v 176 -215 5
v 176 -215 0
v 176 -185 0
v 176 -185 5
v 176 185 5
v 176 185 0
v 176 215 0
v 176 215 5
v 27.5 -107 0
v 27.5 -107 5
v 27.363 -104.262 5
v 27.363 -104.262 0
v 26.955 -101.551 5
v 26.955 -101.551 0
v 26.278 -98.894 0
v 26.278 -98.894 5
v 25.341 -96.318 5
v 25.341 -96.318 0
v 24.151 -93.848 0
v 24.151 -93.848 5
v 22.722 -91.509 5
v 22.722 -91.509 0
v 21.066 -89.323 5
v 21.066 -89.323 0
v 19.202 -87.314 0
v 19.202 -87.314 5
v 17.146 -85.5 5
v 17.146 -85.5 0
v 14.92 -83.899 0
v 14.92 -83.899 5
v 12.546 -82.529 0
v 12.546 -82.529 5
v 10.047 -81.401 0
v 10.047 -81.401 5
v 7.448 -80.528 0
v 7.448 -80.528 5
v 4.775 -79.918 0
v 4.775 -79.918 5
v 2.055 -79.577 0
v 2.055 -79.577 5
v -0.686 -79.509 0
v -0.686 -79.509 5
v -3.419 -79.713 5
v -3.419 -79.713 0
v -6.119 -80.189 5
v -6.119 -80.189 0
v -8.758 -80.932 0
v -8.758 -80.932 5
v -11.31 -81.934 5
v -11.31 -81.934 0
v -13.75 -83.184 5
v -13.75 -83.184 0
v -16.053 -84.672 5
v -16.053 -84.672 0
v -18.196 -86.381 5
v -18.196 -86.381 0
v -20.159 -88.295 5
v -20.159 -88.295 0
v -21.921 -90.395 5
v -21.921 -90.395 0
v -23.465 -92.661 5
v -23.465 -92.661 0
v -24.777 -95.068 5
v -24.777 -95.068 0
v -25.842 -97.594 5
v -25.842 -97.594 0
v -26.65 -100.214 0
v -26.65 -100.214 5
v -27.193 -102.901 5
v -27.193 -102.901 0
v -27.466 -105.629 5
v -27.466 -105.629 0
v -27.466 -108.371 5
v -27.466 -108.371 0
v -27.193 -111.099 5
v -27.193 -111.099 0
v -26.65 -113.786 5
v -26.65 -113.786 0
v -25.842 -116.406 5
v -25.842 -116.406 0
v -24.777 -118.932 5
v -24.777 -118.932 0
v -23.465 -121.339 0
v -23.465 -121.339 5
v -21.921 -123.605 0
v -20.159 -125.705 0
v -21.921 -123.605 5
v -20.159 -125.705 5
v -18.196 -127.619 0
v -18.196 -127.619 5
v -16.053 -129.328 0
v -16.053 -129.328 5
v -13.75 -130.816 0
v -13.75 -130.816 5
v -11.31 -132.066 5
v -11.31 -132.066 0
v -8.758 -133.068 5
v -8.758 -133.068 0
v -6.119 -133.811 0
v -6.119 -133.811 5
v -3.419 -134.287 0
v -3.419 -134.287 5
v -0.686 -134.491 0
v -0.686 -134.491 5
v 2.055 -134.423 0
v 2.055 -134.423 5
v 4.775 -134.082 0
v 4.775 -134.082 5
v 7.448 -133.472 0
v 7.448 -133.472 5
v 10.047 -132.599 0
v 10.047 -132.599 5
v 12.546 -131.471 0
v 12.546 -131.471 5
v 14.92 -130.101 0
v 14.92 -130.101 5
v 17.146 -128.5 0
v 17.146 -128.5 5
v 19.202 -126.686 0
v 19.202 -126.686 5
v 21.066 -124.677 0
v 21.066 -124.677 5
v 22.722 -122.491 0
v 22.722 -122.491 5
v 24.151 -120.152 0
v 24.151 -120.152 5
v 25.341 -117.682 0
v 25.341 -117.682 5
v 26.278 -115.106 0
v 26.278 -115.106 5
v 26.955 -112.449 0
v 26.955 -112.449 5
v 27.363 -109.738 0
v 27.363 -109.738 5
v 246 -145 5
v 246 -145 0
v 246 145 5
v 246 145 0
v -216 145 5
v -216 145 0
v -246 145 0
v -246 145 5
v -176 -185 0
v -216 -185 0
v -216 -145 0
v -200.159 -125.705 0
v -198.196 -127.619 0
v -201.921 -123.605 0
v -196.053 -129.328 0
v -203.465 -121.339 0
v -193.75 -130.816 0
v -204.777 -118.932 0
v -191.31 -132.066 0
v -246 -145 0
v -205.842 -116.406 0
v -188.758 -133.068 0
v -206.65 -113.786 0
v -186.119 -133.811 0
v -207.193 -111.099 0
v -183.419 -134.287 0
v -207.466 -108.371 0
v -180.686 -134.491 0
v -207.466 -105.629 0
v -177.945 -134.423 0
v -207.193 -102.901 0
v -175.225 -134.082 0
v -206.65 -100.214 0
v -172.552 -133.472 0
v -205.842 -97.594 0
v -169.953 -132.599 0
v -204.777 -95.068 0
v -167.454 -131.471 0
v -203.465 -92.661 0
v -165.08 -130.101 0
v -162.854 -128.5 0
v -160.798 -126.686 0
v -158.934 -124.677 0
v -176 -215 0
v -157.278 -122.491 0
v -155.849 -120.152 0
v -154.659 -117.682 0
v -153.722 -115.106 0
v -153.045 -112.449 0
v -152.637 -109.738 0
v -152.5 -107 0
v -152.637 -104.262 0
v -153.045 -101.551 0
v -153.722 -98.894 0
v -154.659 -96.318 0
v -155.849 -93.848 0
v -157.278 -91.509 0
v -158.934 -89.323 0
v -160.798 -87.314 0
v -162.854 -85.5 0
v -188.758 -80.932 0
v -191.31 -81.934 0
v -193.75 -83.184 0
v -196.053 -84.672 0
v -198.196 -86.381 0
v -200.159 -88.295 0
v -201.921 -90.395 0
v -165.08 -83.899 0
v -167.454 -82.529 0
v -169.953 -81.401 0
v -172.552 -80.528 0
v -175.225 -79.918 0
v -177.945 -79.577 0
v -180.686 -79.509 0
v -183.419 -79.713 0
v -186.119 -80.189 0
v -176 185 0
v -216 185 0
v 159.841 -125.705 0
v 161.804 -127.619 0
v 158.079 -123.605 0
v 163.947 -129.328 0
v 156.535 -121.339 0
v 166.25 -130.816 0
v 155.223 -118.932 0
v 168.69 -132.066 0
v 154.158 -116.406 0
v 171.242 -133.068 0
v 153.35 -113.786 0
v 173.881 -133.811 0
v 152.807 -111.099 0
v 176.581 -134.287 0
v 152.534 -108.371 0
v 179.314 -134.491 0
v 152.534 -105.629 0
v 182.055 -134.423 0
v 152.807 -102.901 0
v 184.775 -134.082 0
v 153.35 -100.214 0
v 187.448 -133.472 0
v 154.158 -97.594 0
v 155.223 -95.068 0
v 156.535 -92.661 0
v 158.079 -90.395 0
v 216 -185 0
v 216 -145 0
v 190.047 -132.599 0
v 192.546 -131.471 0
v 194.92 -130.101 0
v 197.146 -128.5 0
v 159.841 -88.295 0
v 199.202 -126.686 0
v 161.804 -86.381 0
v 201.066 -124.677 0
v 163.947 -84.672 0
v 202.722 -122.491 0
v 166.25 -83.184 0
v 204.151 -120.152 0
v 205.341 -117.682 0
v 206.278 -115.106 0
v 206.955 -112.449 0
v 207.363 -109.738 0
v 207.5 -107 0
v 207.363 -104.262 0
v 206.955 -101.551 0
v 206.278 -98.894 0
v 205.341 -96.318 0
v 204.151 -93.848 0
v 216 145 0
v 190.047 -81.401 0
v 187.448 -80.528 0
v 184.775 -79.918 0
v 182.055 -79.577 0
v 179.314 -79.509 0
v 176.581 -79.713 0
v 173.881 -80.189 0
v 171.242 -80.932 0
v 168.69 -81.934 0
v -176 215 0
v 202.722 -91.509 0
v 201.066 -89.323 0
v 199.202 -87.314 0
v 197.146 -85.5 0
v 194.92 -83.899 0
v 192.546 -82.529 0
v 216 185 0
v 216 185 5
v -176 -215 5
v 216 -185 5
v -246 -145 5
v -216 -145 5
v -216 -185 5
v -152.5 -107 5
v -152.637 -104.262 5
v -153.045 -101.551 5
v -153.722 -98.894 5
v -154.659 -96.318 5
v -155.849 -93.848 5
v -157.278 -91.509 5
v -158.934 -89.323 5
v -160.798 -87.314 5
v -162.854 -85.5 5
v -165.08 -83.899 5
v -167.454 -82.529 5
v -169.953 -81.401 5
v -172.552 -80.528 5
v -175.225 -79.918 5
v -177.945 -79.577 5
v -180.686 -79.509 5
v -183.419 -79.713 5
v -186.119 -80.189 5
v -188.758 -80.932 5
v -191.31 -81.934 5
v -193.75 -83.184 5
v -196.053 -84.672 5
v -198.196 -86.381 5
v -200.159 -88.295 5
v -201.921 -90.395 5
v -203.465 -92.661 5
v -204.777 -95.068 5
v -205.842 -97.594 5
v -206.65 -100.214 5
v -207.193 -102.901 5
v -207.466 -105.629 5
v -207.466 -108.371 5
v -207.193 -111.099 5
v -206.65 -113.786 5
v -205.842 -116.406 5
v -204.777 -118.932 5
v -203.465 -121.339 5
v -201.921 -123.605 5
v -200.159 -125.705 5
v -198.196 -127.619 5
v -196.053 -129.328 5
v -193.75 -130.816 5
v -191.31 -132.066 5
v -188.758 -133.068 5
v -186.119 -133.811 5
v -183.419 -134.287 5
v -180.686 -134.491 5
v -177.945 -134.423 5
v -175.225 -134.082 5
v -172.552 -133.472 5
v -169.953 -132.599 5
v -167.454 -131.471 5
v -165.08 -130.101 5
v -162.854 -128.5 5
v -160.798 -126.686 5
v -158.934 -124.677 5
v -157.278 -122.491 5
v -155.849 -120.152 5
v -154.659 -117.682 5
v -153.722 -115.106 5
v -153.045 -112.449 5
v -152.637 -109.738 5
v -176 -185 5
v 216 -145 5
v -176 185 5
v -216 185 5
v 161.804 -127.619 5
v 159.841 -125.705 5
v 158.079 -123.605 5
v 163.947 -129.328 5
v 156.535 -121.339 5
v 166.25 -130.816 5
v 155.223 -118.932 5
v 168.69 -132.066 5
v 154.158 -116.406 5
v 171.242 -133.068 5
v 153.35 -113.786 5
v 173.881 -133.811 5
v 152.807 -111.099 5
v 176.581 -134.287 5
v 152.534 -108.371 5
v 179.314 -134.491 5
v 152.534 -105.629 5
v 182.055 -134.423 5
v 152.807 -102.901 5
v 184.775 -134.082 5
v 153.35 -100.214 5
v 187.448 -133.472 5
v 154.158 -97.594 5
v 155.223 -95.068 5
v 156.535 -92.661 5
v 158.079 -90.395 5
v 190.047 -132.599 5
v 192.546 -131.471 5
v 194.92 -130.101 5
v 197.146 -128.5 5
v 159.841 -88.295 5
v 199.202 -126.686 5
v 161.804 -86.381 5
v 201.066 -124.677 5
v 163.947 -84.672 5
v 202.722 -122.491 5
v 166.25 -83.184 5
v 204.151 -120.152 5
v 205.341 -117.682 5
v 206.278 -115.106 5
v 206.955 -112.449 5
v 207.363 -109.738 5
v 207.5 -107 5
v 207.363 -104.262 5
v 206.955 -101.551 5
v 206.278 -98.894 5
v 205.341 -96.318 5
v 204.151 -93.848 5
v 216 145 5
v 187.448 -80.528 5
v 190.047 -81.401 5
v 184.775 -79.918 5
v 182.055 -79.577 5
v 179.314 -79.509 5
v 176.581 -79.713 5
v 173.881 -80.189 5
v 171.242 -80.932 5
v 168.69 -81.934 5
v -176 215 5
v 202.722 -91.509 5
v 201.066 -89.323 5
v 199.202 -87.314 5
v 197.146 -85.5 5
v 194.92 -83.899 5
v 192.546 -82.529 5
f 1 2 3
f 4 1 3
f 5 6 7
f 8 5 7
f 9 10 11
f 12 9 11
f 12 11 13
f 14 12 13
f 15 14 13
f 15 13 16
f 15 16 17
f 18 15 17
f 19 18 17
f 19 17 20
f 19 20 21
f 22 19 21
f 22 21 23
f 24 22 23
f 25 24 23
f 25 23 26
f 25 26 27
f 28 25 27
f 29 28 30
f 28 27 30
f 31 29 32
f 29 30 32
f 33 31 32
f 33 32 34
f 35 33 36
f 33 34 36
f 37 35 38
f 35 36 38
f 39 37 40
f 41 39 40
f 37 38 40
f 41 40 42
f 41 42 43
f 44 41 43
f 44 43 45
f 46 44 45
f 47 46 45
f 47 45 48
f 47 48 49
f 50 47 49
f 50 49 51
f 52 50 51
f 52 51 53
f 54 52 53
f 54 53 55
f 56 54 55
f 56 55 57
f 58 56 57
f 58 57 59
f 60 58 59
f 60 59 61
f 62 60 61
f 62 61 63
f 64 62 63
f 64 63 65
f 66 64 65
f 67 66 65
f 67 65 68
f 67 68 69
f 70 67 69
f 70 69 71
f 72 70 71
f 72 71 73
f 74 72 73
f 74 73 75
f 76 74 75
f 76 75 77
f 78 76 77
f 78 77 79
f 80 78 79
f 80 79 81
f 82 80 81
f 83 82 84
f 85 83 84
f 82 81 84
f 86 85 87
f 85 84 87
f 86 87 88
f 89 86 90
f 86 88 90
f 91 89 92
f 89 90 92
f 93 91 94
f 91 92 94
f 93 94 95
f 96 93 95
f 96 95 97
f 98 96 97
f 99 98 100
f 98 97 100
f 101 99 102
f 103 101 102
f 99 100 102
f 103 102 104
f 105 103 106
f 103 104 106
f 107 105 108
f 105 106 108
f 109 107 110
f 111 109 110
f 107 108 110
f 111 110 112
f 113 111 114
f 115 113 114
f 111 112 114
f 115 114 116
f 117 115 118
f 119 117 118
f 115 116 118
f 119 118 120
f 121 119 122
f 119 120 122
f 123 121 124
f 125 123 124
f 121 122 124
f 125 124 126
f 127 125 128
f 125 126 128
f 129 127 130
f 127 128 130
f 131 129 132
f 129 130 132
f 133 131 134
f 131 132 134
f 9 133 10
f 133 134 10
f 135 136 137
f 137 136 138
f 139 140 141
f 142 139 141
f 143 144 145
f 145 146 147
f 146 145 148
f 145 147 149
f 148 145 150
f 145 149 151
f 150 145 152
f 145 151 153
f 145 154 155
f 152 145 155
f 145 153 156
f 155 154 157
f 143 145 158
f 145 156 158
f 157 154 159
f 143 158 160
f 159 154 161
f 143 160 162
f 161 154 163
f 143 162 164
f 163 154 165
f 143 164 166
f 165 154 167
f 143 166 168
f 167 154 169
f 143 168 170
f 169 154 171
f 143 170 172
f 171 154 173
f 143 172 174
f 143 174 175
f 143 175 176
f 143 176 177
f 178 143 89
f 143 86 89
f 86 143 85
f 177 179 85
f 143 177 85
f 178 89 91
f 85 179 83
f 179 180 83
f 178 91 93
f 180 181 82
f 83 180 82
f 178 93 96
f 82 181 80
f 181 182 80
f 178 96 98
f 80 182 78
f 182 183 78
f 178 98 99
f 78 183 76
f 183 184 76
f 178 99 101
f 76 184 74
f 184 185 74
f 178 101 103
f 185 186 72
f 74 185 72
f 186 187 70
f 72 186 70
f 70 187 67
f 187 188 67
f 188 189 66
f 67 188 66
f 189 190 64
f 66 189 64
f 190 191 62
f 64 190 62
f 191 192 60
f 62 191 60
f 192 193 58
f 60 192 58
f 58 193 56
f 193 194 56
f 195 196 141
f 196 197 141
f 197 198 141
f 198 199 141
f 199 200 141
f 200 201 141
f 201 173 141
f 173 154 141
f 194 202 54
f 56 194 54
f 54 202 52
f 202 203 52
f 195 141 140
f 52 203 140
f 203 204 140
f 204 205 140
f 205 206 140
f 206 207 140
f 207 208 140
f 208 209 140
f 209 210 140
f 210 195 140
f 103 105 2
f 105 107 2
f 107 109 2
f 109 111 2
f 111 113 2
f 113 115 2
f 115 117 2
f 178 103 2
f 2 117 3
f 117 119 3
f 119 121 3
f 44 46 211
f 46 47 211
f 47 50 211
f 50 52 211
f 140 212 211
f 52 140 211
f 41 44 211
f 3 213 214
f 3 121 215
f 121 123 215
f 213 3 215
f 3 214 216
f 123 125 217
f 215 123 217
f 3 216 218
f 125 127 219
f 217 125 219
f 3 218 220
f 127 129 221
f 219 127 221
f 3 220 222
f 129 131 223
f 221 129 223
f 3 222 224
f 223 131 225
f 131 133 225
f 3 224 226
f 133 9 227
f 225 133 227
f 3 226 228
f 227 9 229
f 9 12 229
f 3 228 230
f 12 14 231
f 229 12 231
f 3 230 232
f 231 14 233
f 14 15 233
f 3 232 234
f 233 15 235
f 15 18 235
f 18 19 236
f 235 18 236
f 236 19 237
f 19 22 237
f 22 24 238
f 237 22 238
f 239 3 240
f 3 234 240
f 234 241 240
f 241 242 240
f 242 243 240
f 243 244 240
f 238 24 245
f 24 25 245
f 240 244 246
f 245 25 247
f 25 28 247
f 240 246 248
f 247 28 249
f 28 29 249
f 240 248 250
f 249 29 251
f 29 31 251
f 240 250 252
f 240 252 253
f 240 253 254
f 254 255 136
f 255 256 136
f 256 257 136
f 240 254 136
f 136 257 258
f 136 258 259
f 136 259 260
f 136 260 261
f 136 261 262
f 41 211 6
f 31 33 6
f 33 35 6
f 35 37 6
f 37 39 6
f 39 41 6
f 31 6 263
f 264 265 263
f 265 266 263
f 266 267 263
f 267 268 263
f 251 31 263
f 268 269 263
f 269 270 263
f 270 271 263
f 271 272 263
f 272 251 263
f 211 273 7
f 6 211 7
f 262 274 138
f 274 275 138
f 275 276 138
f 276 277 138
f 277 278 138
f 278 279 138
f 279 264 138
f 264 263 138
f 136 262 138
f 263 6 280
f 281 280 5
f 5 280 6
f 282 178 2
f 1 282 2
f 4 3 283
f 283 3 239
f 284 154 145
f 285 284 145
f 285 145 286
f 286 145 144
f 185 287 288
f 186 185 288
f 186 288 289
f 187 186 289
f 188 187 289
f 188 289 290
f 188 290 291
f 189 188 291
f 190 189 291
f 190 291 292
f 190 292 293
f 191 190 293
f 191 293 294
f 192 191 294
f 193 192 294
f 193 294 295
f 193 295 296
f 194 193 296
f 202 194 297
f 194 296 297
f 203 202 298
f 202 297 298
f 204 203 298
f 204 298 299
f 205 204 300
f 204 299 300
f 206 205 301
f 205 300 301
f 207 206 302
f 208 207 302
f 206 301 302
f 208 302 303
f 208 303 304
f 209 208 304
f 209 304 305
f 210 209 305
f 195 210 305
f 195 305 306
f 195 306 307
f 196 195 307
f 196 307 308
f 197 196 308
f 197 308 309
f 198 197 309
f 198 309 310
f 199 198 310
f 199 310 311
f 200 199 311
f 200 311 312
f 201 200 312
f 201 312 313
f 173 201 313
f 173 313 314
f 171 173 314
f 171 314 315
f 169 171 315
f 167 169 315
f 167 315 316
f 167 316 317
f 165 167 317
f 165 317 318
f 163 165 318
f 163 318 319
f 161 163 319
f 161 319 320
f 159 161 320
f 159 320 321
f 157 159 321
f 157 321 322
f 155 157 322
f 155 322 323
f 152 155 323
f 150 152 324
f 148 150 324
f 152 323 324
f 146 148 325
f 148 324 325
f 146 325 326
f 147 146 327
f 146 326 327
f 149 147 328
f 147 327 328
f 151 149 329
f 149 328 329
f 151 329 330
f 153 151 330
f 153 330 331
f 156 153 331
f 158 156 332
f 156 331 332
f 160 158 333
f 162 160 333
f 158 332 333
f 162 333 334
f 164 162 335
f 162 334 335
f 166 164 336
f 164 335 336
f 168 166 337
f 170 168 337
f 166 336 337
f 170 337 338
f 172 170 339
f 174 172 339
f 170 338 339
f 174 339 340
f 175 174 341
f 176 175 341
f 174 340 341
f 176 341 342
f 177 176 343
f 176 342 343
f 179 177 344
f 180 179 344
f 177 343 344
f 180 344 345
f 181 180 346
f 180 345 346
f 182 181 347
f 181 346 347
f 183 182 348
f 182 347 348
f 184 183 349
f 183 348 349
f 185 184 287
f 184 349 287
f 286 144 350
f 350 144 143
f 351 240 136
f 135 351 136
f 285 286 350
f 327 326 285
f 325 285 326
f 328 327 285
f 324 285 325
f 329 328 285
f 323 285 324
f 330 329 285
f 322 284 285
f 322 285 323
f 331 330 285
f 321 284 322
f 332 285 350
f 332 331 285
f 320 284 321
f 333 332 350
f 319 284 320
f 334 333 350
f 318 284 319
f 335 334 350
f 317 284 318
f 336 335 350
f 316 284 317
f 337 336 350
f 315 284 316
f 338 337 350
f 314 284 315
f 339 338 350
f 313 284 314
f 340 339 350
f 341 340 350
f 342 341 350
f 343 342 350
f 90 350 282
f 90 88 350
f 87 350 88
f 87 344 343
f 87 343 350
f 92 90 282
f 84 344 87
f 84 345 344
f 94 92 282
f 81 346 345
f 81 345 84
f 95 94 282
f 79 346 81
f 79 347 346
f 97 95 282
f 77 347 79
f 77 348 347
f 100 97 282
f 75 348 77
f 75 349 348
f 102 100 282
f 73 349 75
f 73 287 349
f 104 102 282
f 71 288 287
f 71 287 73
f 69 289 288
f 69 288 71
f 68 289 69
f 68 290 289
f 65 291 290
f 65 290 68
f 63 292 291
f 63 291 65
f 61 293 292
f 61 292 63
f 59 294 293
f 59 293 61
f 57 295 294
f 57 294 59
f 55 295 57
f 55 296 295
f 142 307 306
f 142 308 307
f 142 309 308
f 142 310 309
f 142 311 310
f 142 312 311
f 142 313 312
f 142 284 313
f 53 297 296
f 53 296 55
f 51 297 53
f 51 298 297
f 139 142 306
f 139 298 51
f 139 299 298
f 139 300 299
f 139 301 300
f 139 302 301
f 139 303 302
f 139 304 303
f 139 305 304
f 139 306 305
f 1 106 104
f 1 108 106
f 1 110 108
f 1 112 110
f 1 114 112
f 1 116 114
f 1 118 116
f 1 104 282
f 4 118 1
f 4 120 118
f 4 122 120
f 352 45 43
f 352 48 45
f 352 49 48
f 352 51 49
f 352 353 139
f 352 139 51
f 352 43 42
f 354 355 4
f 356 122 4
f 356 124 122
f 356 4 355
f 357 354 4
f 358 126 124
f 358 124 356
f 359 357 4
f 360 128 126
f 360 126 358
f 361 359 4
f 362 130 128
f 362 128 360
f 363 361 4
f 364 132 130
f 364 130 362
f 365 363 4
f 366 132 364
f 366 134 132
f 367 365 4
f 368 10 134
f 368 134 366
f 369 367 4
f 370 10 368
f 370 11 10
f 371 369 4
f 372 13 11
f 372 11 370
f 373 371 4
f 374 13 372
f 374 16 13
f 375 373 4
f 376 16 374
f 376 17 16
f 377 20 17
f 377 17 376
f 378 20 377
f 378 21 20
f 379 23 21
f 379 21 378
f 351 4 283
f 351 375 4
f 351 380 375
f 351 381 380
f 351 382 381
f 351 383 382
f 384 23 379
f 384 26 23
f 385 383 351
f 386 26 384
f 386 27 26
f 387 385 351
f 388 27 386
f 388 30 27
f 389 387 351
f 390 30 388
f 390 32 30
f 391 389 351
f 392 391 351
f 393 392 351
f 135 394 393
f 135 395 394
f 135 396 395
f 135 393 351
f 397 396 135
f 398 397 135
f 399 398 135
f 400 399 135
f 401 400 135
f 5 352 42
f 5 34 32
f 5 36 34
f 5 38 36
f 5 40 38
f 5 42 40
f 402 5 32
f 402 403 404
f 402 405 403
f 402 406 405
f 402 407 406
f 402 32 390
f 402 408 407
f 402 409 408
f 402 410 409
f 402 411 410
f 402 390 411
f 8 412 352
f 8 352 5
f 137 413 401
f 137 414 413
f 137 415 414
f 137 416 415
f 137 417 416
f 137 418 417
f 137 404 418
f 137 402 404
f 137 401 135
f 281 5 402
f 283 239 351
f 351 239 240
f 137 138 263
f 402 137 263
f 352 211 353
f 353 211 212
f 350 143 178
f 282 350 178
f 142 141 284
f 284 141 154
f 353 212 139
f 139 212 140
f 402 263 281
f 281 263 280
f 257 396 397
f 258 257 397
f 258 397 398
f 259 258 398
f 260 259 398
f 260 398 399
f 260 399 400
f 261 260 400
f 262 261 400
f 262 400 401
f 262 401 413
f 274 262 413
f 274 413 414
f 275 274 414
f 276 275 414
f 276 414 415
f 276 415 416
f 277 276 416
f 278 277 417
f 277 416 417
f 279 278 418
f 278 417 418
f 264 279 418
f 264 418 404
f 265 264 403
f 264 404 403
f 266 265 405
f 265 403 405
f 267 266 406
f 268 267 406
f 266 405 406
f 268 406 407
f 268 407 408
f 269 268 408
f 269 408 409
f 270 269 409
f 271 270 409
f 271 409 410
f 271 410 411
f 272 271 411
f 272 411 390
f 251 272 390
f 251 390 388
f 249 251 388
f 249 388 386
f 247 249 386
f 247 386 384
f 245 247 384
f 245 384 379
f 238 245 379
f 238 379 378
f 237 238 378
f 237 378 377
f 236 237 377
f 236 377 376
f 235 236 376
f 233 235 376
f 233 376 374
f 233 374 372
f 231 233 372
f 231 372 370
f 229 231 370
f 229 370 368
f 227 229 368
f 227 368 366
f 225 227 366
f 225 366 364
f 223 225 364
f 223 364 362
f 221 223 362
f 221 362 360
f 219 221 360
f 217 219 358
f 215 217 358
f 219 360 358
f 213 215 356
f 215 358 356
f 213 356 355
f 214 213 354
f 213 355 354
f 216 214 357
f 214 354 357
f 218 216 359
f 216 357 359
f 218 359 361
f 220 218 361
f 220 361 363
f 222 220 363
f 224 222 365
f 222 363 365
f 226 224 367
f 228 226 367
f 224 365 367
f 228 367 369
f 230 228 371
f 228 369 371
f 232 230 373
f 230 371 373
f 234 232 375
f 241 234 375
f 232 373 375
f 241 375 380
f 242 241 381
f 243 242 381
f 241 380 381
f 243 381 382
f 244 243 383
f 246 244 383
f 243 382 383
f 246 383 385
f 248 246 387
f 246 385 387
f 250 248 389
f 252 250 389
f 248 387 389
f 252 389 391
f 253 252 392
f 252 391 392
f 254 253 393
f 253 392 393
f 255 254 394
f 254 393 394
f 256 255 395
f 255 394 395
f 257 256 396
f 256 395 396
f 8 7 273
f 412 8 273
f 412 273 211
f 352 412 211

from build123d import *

# Parameters (mm, degrees)
SALIENTE_EXTRUIR1_DEPTH = 5
CROQUIS2_R              = 27.5
CORTAR_EXTRUIR1_DEPTH   = 10


with BuildPart() as part:
    # Croquis1 → Saliente-Extruir1 (new body)
    with BuildSketch(Plane.XY):
        Polygon((0, 215), (0, 0), (246, 0), (246, 145), (216, 145), (216, 185), (176, 185), (176, 215), align=None)
        Polygon((-246, 145), (-246, 0), (0, 0), (0, 215), (-176, 215), (-176, 185), (-216, 185), (-216, 145), align=None)
        Polygon((0, 0), (-246, 0), (-246, -145), (-216, -145), (-216, -185), (-176, -185), (-176, -215), (176, -215), (176, -185), (216, -185), (216, -145), (246, -145), (246, 0), align=None)
    extrude(amount=SALIENTE_EXTRUIR1_DEPTH)

    # Croquis2 → Cortar-Extruir1 (cut)
    with BuildSketch(Plane.XY.offset(5)):
        with Locations((-180, -107)):
            Circle(CROQUIS2_R)
        with Locations((0, -107)):
            Circle(CROQUIS2_R)
        with Locations((180, -107)):
            Circle(CROQUIS2_R)
    extrude(amount=-CORTAR_EXTRUIR1_DEPTH, mode=Mode.SUBTRACT)


solid = part.part
